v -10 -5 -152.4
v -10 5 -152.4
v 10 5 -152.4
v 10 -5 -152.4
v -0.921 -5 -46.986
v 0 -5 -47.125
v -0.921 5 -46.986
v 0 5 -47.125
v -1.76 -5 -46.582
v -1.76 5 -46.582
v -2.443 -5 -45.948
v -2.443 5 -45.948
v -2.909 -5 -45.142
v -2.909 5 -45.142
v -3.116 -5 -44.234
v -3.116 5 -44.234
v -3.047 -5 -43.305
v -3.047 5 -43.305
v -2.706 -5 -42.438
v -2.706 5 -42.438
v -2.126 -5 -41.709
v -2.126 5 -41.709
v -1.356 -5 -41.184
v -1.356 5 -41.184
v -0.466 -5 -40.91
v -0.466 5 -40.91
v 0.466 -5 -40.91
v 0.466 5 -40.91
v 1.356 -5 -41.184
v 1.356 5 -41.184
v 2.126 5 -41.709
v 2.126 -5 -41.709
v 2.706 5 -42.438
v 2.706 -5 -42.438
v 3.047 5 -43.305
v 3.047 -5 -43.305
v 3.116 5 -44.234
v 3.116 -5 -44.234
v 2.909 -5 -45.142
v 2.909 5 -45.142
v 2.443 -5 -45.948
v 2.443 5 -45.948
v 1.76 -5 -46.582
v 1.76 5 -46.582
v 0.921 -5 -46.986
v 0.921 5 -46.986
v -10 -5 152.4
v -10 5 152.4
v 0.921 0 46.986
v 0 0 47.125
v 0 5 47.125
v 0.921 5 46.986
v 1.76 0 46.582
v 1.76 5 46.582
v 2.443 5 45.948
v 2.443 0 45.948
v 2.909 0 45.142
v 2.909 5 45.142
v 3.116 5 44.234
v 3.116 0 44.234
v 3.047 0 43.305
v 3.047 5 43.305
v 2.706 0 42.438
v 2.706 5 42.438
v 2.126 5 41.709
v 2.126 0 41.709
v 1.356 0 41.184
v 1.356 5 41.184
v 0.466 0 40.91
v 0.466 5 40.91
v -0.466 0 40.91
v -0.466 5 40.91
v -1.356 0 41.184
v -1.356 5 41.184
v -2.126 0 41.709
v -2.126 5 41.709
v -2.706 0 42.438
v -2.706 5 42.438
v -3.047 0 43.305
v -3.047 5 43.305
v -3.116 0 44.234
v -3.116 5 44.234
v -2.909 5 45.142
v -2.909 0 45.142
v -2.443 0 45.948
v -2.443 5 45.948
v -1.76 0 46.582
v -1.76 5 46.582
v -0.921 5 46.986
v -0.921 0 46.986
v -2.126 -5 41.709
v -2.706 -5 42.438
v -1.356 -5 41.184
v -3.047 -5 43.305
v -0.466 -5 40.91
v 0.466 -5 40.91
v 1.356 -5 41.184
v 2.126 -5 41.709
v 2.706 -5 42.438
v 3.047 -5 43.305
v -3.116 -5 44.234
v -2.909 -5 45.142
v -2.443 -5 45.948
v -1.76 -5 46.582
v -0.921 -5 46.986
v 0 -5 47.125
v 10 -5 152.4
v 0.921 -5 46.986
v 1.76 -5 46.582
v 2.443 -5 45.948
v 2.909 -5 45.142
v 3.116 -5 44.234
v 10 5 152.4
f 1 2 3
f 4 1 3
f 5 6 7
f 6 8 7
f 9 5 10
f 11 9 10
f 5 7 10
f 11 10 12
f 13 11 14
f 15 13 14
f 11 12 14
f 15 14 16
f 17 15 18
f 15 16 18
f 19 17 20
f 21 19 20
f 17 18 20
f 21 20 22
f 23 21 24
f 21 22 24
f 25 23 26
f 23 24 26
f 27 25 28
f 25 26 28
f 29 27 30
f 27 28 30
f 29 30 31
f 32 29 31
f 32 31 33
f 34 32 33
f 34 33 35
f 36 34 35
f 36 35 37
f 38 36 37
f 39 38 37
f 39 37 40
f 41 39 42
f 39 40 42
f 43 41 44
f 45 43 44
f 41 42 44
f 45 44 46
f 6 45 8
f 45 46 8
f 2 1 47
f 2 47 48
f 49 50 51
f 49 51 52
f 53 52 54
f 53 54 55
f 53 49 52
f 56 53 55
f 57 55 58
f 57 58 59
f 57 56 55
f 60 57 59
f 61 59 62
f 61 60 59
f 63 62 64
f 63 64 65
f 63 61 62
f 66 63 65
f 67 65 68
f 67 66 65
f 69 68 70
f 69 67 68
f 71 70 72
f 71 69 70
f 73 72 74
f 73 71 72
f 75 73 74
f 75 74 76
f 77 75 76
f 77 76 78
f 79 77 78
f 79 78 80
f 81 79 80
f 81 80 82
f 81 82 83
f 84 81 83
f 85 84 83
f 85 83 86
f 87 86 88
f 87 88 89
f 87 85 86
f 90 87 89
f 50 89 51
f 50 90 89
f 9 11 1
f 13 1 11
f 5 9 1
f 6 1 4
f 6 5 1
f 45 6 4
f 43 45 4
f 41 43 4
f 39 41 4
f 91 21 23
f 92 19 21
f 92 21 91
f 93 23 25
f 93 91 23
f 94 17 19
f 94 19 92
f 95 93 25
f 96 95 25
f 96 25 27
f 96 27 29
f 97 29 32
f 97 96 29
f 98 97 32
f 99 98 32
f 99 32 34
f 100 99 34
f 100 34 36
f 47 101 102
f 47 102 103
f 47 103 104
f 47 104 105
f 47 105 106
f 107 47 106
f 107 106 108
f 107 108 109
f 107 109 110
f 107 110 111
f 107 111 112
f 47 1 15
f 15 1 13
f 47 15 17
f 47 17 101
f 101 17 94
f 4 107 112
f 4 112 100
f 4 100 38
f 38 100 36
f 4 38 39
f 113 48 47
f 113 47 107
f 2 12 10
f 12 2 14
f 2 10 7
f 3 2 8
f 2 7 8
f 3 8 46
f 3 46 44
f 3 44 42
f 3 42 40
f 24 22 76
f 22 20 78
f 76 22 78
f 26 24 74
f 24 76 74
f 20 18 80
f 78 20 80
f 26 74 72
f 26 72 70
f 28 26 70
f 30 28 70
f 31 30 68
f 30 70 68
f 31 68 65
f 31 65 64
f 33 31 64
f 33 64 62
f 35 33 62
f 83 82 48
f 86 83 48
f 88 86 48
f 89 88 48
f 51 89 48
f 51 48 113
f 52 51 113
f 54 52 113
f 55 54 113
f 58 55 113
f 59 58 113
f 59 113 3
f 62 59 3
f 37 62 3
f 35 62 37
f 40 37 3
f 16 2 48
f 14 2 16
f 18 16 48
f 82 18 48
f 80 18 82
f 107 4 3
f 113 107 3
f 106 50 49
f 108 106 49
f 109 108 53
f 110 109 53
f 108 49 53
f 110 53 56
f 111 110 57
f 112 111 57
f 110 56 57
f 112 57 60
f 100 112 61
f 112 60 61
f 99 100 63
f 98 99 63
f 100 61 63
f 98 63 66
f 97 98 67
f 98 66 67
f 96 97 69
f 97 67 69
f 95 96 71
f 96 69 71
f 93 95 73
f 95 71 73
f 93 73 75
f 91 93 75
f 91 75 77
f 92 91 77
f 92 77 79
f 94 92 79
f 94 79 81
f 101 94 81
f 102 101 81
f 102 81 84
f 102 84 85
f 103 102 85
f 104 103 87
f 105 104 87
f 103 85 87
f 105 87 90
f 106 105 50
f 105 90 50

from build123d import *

# Parameters (mm, degrees)
SKETCH3_W           = 20
SKETCH3_H           = 10
BOSS_EXTRUDE1_DEPTH = 152.4
SKETCH4_R           = 3.125
CUT_EXTRUDE1_DEPTH  = 5


with BuildPart() as part:
    # Sketch3 → Boss-Extrude1 (new, symmetric)
    with BuildSketch(Plane.XY):
        Rectangle(SKETCH3_W, SKETCH3_H)
    extrude(amount=BOSS_EXTRUDE1_DEPTH, both=True)

    # Sketch4 → Cut-Extrude1 (cut, symmetric)
    with BuildSketch(Plane(origin=(0, 0, 0), x_dir=(1, 0, 0), z_dir=(0, 1, 0))):
        with Locations(Location((0, -44, 0), (0, 0, 270))):
            Circle(SKETCH4_R)
        with Locations(Location((0, 44, 0), (0, 0, 90))):
            Circle(SKETCH4_R)
    extrude(amount=CUT_EXTRUDE1_DEPTH, both=True, mode=Mode.SUBTRACT)


solid = part.part
